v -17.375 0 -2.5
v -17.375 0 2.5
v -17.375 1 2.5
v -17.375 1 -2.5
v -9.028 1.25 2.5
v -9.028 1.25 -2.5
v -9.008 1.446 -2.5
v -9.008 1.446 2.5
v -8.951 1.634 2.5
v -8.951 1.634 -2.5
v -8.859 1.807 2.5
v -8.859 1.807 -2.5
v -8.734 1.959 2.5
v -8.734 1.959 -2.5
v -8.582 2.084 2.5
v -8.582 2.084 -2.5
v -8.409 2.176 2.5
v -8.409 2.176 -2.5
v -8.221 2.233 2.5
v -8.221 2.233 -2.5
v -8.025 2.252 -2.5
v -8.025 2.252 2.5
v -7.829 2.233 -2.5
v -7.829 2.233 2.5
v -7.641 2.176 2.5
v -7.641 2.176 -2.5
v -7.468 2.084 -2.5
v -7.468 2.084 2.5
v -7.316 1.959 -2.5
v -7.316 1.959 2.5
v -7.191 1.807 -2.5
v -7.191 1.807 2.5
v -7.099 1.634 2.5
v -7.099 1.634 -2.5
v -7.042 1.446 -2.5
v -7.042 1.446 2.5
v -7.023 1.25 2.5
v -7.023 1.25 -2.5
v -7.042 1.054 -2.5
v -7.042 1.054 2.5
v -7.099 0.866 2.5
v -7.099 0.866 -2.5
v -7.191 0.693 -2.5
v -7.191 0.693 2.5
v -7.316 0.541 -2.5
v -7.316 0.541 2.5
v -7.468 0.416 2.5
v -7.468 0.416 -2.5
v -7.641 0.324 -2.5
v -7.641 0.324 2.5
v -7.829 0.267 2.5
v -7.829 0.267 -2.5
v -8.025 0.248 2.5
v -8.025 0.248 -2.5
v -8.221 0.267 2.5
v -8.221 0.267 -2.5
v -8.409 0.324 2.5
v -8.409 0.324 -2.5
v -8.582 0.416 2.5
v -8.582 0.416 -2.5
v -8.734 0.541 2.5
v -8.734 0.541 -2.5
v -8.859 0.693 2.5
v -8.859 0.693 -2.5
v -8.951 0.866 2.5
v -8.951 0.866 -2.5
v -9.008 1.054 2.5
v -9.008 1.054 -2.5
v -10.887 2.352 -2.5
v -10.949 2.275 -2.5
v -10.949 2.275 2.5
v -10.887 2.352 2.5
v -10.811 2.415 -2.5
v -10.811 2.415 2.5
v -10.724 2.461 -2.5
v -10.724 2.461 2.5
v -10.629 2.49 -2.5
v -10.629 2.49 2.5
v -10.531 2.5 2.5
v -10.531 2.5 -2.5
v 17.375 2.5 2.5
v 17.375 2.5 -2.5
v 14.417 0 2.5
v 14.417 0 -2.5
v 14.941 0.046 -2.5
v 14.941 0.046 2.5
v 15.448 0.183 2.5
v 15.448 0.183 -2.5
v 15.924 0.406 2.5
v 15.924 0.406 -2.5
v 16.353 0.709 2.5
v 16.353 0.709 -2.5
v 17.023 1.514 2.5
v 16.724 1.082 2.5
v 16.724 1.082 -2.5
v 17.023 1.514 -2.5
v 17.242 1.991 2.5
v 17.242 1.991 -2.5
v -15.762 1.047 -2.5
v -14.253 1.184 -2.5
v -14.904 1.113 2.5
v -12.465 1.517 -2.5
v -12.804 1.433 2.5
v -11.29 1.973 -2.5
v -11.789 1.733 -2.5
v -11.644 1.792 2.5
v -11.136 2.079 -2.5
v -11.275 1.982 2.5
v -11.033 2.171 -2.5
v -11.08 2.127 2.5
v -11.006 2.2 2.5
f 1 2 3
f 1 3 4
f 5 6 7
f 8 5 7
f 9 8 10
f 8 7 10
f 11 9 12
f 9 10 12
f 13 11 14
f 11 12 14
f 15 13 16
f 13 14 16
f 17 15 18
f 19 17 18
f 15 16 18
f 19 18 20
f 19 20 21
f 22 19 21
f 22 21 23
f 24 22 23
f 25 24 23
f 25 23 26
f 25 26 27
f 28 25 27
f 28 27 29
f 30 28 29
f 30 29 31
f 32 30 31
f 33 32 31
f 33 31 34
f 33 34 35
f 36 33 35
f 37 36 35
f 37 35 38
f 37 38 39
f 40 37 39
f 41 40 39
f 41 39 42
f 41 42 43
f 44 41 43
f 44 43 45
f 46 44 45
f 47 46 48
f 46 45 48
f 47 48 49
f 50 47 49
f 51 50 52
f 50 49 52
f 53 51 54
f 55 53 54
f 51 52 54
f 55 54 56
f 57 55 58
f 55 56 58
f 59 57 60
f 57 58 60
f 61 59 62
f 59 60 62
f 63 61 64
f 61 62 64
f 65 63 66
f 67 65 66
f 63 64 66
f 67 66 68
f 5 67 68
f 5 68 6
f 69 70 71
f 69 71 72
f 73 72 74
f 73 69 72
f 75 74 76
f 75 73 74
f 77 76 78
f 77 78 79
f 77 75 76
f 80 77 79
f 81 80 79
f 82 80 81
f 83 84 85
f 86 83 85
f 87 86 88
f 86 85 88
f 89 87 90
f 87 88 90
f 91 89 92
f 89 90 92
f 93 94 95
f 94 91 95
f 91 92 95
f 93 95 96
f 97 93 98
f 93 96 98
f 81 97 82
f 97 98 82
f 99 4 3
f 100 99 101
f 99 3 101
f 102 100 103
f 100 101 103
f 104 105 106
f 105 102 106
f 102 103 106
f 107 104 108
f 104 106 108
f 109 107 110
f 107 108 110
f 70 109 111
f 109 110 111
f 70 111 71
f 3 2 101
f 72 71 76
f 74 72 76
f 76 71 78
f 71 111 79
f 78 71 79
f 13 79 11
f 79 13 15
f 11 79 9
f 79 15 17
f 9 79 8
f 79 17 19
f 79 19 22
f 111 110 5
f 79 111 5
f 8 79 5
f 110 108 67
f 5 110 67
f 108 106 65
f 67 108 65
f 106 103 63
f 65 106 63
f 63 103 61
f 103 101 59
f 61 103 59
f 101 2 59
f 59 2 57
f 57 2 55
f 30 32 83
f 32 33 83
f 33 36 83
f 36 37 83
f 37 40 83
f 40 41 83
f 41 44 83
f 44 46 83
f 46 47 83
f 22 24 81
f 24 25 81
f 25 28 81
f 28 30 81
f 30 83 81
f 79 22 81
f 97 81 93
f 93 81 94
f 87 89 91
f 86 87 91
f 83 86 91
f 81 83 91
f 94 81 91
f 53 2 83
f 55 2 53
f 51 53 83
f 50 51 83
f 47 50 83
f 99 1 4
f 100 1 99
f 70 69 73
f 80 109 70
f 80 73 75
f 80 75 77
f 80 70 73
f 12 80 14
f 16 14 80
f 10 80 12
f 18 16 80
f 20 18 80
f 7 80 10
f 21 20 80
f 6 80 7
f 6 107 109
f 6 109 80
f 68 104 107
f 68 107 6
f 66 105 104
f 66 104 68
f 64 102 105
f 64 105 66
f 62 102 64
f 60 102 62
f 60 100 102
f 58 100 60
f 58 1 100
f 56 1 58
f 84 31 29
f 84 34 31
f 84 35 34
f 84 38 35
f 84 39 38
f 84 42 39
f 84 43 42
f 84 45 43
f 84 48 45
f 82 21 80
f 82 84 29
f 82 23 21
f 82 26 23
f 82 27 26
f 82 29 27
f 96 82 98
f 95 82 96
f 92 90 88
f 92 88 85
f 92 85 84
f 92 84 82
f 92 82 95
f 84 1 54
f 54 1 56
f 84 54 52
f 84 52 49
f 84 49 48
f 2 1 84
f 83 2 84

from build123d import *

# Parameters (mm, degrees)
SKETCH1_W             = 34.75
SKETCH1_H             = 5
BOSS_EXTRUDE1_DEPTH   = 2.5
F_1_0MM_DOWEL_HOLE1_D = 2.005
SKETCH15_RX           = 6.5
SKETCH15_RY           = 1.5
CUT_EXTRUDE1_DEPTH    = 10
FILLET1_START         = -3
FILLET1_DEPTH         = 6
FILLET2_R             = 3


with BuildPart() as part:
    # Sketch1 → Boss-Extrude1 (new body)
    with BuildSketch(Plane(origin=(0, 0, 0), x_dir=(1, 0, 0), z_dir=(0, 1, 0))):
        Rectangle(SKETCH1_W, SKETCH1_H)
    extrude(amount=BOSS_EXTRUDE1_DEPTH)

    # Ø1.0mm Dowel Hole1 (through all)
    with Locations(Plane.XY.offset(2.5)):
        with Locations((-8.025, 1.25)):
            Hole(F_1_0MM_DOWEL_HOLE1_D / 2)

    # Sketch15 → Cut-Extrude1 (cut)
    with BuildSketch(Plane.XY.offset(2.5)):
        with Locations((-17.375, 2.5)):
            Ellipse(SKETCH15_RX, SKETCH15_RY)
    extrude(amount=-CUT_EXTRUDE1_DEPTH, mode=Mode.SUBTRACT)

    # Fillet1: read off the stored shape, not the designer's step
    # Fillet1 outline → Fillet1 (cut)
    with BuildSketch(Plane.XY.offset(FILLET1_START)):
        with BuildLine():
            ThreePointArc((-10.948655177, 2.274826432), (-10.768220883, 2.440121129), (-10.530958598, 2.5))
            Line((-10.530958598, 2.5), (-10.875, 2.5))
            add(Edge.make_bspline(
                [(-10.948655177, 2.274826432), (-10.875, 2.386771689), (-10.875, 2.5)],
                knots=[6.120582714, 6.120582714, 6.120582714, 6.283185307, 6.283185307, 6.283185307], degree=2, weights=[0.94563875, 0.969680858, 1]))
        make_face()
    extrude(amount=FILLET1_DEPTH, mode=Mode.SUBTRACT)

    # Fillet2
    # the kernel refuses this fillet: 3 mm, written as the material it takes off along each edge
    with BuildSketch(Plane(origin=(17.375, 0, -9.895099729), x_dir=(-1, 0, 0), z_dir=(0, 0, 1))) as fillet2_piece_1:
        with BuildLine():
            CenterArc((2.958039892, -3), FILLET2_R, 90, 80.405931773)
            Line((0, -2.5), (-0.059160798, -2.49))
            ThreePointArc((-0.059160798, -2.49), (-0.06, -1.25), (-0.06, 0))
            Line((-0.06, 0), (0, 0.06))
            Line((0, 0.06), (2.958039892, 0.06))
            Line((2.958039892, 0.06), (2.958039892, 0))
        make_face()
    extrude(amount=19.790199458, mode=Mode.SUBTRACT)


solid = part.part
